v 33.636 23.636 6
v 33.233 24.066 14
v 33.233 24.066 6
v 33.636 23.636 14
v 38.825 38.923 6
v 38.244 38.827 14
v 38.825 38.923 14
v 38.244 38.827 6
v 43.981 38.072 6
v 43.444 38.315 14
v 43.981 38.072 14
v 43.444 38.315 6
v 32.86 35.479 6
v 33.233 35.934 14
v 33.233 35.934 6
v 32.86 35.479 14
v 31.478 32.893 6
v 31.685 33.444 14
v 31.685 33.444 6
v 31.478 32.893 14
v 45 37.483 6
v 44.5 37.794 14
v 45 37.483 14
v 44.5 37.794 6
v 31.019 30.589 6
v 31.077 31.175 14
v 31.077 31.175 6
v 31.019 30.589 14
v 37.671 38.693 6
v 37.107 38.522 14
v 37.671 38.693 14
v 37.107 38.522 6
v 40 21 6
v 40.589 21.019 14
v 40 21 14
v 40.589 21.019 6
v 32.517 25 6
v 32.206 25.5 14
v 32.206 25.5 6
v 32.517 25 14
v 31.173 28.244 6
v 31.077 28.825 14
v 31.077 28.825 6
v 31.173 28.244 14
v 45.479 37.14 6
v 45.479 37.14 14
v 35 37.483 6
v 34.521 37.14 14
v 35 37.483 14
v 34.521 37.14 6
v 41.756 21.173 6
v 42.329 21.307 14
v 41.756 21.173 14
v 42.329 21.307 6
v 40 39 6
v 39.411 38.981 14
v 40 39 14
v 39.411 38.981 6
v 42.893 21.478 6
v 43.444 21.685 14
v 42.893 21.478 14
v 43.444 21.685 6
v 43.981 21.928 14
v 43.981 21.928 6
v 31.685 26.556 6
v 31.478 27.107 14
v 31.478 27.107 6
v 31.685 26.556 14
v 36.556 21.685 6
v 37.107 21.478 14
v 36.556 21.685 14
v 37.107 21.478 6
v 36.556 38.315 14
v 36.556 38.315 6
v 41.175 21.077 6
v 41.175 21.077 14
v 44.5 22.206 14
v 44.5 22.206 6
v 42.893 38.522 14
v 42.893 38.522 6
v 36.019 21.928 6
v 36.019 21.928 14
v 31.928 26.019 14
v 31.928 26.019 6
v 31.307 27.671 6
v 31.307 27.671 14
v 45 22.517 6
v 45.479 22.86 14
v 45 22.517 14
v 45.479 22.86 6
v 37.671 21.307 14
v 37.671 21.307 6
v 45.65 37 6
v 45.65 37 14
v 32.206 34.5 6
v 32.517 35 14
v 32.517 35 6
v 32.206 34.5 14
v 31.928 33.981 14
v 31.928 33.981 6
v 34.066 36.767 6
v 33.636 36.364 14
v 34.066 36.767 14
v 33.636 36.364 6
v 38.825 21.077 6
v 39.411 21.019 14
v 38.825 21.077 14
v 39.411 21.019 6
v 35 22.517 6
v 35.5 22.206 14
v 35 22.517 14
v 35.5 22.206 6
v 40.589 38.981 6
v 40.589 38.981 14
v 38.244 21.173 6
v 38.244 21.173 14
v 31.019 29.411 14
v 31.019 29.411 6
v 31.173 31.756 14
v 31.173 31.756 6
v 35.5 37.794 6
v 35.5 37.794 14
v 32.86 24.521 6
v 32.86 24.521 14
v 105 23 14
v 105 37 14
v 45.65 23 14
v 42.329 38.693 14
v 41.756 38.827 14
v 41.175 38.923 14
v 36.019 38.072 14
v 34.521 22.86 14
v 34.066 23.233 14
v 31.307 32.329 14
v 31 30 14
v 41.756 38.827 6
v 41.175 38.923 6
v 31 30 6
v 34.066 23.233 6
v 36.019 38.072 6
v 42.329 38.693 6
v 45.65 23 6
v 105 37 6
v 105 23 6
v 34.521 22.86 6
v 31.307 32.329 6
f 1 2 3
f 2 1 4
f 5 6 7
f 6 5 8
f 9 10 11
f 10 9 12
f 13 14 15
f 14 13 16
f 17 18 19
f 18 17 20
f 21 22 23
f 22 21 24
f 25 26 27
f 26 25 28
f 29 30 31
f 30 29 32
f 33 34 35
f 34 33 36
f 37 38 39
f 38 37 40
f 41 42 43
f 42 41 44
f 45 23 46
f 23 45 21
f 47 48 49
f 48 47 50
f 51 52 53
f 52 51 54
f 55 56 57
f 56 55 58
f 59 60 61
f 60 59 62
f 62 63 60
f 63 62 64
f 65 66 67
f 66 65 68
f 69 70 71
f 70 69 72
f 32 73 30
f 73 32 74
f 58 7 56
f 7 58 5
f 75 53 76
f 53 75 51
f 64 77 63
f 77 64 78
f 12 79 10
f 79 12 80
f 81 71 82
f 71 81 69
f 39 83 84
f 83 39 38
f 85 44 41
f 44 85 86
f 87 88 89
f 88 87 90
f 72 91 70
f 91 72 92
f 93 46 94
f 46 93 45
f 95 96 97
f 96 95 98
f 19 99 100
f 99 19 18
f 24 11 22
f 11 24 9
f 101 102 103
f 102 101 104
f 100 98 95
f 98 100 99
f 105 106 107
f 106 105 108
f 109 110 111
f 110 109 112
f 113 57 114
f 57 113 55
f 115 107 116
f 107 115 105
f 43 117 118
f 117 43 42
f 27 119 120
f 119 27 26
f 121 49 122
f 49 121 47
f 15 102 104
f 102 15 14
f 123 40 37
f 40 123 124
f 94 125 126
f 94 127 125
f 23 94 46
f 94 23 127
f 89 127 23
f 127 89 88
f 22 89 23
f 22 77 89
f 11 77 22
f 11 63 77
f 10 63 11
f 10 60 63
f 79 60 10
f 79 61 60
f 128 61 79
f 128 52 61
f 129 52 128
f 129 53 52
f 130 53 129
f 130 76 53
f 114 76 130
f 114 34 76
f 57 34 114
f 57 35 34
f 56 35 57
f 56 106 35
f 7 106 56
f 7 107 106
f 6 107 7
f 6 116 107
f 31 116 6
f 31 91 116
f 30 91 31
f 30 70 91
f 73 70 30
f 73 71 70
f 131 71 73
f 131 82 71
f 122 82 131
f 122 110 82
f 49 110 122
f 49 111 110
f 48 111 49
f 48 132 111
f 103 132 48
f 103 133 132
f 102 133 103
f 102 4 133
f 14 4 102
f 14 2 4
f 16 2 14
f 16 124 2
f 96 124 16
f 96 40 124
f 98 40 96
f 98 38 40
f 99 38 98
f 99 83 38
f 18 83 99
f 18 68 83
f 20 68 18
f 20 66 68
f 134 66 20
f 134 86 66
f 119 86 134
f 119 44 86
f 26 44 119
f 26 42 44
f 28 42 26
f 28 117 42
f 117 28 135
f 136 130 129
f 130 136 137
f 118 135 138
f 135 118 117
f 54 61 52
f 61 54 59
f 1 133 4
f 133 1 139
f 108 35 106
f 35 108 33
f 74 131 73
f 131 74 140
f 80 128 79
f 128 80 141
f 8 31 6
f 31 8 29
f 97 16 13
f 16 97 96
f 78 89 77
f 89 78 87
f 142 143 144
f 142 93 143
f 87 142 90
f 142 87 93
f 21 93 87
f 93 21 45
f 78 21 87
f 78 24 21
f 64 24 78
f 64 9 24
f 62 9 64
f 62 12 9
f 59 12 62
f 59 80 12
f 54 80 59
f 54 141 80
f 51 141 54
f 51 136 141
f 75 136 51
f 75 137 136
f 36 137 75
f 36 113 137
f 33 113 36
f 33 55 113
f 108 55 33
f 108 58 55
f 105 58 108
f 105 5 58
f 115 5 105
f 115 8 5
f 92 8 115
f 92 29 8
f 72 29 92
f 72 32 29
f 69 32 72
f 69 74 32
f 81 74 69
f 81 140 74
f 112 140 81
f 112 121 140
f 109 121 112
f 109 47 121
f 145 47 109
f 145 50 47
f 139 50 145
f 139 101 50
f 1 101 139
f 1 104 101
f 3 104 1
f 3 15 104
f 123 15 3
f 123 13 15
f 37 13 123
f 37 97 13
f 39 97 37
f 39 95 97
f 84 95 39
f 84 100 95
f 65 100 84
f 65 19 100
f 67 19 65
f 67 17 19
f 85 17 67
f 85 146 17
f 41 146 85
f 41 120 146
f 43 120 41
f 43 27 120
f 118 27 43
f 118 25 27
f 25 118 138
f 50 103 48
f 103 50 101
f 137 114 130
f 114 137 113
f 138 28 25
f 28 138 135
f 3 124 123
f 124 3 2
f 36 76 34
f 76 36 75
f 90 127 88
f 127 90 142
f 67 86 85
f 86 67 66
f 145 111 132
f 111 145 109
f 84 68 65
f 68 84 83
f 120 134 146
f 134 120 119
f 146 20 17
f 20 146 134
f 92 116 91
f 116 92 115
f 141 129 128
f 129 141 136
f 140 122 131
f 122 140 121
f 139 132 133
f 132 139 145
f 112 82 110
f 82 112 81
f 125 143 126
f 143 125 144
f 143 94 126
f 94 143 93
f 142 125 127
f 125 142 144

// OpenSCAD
// file: ../config.scad
// Shared project parameters.
// Replace EXAMPLE_* with real project parameter families after planning.

$fn = $preview ? 48 : 96;

// Manufacturing defaults — calibrate for the real printer/material.
FIT = 0.25;
PRESS_FIT = 0.10;
CLEARANCE = 0.40;
MIN_WALL = 2.40;

// Template demonstration geometry only.
EXAMPLE_PLATE = [80, 60, 6];
EXAMPLE_CORNER_R = 6;
EXAMPLE_HOLE_D = 4.4;
EXAMPLE_HOLE_SPACING = [60, 40];
EXAMPLE_ARM_L = 65;
EXAMPLE_ARM_W = 14;
EXAMPLE_ARM_H = 8;
EXAMPLE_PIVOT_D = 6;
EXAMPLE_MOTION_MIN = -45;
EXAMPLE_MOTION_MAX = 90;
// main file
include <../config.scad>

// Reference-pose moving collision body for mesh_motion_qa.py.
pivot = [EXAMPLE_PLATE[0]/2, EXAMPLE_PLATE[1]/2, EXAMPLE_PLATE[2]];
translate(pivot) {
    cylinder(d = 18, h = EXAMPLE_ARM_H);
    translate([0, -EXAMPLE_ARM_W/2, 0])
        cube([EXAMPLE_ARM_L, EXAMPLE_ARM_W, EXAMPLE_ARM_H]);
}
